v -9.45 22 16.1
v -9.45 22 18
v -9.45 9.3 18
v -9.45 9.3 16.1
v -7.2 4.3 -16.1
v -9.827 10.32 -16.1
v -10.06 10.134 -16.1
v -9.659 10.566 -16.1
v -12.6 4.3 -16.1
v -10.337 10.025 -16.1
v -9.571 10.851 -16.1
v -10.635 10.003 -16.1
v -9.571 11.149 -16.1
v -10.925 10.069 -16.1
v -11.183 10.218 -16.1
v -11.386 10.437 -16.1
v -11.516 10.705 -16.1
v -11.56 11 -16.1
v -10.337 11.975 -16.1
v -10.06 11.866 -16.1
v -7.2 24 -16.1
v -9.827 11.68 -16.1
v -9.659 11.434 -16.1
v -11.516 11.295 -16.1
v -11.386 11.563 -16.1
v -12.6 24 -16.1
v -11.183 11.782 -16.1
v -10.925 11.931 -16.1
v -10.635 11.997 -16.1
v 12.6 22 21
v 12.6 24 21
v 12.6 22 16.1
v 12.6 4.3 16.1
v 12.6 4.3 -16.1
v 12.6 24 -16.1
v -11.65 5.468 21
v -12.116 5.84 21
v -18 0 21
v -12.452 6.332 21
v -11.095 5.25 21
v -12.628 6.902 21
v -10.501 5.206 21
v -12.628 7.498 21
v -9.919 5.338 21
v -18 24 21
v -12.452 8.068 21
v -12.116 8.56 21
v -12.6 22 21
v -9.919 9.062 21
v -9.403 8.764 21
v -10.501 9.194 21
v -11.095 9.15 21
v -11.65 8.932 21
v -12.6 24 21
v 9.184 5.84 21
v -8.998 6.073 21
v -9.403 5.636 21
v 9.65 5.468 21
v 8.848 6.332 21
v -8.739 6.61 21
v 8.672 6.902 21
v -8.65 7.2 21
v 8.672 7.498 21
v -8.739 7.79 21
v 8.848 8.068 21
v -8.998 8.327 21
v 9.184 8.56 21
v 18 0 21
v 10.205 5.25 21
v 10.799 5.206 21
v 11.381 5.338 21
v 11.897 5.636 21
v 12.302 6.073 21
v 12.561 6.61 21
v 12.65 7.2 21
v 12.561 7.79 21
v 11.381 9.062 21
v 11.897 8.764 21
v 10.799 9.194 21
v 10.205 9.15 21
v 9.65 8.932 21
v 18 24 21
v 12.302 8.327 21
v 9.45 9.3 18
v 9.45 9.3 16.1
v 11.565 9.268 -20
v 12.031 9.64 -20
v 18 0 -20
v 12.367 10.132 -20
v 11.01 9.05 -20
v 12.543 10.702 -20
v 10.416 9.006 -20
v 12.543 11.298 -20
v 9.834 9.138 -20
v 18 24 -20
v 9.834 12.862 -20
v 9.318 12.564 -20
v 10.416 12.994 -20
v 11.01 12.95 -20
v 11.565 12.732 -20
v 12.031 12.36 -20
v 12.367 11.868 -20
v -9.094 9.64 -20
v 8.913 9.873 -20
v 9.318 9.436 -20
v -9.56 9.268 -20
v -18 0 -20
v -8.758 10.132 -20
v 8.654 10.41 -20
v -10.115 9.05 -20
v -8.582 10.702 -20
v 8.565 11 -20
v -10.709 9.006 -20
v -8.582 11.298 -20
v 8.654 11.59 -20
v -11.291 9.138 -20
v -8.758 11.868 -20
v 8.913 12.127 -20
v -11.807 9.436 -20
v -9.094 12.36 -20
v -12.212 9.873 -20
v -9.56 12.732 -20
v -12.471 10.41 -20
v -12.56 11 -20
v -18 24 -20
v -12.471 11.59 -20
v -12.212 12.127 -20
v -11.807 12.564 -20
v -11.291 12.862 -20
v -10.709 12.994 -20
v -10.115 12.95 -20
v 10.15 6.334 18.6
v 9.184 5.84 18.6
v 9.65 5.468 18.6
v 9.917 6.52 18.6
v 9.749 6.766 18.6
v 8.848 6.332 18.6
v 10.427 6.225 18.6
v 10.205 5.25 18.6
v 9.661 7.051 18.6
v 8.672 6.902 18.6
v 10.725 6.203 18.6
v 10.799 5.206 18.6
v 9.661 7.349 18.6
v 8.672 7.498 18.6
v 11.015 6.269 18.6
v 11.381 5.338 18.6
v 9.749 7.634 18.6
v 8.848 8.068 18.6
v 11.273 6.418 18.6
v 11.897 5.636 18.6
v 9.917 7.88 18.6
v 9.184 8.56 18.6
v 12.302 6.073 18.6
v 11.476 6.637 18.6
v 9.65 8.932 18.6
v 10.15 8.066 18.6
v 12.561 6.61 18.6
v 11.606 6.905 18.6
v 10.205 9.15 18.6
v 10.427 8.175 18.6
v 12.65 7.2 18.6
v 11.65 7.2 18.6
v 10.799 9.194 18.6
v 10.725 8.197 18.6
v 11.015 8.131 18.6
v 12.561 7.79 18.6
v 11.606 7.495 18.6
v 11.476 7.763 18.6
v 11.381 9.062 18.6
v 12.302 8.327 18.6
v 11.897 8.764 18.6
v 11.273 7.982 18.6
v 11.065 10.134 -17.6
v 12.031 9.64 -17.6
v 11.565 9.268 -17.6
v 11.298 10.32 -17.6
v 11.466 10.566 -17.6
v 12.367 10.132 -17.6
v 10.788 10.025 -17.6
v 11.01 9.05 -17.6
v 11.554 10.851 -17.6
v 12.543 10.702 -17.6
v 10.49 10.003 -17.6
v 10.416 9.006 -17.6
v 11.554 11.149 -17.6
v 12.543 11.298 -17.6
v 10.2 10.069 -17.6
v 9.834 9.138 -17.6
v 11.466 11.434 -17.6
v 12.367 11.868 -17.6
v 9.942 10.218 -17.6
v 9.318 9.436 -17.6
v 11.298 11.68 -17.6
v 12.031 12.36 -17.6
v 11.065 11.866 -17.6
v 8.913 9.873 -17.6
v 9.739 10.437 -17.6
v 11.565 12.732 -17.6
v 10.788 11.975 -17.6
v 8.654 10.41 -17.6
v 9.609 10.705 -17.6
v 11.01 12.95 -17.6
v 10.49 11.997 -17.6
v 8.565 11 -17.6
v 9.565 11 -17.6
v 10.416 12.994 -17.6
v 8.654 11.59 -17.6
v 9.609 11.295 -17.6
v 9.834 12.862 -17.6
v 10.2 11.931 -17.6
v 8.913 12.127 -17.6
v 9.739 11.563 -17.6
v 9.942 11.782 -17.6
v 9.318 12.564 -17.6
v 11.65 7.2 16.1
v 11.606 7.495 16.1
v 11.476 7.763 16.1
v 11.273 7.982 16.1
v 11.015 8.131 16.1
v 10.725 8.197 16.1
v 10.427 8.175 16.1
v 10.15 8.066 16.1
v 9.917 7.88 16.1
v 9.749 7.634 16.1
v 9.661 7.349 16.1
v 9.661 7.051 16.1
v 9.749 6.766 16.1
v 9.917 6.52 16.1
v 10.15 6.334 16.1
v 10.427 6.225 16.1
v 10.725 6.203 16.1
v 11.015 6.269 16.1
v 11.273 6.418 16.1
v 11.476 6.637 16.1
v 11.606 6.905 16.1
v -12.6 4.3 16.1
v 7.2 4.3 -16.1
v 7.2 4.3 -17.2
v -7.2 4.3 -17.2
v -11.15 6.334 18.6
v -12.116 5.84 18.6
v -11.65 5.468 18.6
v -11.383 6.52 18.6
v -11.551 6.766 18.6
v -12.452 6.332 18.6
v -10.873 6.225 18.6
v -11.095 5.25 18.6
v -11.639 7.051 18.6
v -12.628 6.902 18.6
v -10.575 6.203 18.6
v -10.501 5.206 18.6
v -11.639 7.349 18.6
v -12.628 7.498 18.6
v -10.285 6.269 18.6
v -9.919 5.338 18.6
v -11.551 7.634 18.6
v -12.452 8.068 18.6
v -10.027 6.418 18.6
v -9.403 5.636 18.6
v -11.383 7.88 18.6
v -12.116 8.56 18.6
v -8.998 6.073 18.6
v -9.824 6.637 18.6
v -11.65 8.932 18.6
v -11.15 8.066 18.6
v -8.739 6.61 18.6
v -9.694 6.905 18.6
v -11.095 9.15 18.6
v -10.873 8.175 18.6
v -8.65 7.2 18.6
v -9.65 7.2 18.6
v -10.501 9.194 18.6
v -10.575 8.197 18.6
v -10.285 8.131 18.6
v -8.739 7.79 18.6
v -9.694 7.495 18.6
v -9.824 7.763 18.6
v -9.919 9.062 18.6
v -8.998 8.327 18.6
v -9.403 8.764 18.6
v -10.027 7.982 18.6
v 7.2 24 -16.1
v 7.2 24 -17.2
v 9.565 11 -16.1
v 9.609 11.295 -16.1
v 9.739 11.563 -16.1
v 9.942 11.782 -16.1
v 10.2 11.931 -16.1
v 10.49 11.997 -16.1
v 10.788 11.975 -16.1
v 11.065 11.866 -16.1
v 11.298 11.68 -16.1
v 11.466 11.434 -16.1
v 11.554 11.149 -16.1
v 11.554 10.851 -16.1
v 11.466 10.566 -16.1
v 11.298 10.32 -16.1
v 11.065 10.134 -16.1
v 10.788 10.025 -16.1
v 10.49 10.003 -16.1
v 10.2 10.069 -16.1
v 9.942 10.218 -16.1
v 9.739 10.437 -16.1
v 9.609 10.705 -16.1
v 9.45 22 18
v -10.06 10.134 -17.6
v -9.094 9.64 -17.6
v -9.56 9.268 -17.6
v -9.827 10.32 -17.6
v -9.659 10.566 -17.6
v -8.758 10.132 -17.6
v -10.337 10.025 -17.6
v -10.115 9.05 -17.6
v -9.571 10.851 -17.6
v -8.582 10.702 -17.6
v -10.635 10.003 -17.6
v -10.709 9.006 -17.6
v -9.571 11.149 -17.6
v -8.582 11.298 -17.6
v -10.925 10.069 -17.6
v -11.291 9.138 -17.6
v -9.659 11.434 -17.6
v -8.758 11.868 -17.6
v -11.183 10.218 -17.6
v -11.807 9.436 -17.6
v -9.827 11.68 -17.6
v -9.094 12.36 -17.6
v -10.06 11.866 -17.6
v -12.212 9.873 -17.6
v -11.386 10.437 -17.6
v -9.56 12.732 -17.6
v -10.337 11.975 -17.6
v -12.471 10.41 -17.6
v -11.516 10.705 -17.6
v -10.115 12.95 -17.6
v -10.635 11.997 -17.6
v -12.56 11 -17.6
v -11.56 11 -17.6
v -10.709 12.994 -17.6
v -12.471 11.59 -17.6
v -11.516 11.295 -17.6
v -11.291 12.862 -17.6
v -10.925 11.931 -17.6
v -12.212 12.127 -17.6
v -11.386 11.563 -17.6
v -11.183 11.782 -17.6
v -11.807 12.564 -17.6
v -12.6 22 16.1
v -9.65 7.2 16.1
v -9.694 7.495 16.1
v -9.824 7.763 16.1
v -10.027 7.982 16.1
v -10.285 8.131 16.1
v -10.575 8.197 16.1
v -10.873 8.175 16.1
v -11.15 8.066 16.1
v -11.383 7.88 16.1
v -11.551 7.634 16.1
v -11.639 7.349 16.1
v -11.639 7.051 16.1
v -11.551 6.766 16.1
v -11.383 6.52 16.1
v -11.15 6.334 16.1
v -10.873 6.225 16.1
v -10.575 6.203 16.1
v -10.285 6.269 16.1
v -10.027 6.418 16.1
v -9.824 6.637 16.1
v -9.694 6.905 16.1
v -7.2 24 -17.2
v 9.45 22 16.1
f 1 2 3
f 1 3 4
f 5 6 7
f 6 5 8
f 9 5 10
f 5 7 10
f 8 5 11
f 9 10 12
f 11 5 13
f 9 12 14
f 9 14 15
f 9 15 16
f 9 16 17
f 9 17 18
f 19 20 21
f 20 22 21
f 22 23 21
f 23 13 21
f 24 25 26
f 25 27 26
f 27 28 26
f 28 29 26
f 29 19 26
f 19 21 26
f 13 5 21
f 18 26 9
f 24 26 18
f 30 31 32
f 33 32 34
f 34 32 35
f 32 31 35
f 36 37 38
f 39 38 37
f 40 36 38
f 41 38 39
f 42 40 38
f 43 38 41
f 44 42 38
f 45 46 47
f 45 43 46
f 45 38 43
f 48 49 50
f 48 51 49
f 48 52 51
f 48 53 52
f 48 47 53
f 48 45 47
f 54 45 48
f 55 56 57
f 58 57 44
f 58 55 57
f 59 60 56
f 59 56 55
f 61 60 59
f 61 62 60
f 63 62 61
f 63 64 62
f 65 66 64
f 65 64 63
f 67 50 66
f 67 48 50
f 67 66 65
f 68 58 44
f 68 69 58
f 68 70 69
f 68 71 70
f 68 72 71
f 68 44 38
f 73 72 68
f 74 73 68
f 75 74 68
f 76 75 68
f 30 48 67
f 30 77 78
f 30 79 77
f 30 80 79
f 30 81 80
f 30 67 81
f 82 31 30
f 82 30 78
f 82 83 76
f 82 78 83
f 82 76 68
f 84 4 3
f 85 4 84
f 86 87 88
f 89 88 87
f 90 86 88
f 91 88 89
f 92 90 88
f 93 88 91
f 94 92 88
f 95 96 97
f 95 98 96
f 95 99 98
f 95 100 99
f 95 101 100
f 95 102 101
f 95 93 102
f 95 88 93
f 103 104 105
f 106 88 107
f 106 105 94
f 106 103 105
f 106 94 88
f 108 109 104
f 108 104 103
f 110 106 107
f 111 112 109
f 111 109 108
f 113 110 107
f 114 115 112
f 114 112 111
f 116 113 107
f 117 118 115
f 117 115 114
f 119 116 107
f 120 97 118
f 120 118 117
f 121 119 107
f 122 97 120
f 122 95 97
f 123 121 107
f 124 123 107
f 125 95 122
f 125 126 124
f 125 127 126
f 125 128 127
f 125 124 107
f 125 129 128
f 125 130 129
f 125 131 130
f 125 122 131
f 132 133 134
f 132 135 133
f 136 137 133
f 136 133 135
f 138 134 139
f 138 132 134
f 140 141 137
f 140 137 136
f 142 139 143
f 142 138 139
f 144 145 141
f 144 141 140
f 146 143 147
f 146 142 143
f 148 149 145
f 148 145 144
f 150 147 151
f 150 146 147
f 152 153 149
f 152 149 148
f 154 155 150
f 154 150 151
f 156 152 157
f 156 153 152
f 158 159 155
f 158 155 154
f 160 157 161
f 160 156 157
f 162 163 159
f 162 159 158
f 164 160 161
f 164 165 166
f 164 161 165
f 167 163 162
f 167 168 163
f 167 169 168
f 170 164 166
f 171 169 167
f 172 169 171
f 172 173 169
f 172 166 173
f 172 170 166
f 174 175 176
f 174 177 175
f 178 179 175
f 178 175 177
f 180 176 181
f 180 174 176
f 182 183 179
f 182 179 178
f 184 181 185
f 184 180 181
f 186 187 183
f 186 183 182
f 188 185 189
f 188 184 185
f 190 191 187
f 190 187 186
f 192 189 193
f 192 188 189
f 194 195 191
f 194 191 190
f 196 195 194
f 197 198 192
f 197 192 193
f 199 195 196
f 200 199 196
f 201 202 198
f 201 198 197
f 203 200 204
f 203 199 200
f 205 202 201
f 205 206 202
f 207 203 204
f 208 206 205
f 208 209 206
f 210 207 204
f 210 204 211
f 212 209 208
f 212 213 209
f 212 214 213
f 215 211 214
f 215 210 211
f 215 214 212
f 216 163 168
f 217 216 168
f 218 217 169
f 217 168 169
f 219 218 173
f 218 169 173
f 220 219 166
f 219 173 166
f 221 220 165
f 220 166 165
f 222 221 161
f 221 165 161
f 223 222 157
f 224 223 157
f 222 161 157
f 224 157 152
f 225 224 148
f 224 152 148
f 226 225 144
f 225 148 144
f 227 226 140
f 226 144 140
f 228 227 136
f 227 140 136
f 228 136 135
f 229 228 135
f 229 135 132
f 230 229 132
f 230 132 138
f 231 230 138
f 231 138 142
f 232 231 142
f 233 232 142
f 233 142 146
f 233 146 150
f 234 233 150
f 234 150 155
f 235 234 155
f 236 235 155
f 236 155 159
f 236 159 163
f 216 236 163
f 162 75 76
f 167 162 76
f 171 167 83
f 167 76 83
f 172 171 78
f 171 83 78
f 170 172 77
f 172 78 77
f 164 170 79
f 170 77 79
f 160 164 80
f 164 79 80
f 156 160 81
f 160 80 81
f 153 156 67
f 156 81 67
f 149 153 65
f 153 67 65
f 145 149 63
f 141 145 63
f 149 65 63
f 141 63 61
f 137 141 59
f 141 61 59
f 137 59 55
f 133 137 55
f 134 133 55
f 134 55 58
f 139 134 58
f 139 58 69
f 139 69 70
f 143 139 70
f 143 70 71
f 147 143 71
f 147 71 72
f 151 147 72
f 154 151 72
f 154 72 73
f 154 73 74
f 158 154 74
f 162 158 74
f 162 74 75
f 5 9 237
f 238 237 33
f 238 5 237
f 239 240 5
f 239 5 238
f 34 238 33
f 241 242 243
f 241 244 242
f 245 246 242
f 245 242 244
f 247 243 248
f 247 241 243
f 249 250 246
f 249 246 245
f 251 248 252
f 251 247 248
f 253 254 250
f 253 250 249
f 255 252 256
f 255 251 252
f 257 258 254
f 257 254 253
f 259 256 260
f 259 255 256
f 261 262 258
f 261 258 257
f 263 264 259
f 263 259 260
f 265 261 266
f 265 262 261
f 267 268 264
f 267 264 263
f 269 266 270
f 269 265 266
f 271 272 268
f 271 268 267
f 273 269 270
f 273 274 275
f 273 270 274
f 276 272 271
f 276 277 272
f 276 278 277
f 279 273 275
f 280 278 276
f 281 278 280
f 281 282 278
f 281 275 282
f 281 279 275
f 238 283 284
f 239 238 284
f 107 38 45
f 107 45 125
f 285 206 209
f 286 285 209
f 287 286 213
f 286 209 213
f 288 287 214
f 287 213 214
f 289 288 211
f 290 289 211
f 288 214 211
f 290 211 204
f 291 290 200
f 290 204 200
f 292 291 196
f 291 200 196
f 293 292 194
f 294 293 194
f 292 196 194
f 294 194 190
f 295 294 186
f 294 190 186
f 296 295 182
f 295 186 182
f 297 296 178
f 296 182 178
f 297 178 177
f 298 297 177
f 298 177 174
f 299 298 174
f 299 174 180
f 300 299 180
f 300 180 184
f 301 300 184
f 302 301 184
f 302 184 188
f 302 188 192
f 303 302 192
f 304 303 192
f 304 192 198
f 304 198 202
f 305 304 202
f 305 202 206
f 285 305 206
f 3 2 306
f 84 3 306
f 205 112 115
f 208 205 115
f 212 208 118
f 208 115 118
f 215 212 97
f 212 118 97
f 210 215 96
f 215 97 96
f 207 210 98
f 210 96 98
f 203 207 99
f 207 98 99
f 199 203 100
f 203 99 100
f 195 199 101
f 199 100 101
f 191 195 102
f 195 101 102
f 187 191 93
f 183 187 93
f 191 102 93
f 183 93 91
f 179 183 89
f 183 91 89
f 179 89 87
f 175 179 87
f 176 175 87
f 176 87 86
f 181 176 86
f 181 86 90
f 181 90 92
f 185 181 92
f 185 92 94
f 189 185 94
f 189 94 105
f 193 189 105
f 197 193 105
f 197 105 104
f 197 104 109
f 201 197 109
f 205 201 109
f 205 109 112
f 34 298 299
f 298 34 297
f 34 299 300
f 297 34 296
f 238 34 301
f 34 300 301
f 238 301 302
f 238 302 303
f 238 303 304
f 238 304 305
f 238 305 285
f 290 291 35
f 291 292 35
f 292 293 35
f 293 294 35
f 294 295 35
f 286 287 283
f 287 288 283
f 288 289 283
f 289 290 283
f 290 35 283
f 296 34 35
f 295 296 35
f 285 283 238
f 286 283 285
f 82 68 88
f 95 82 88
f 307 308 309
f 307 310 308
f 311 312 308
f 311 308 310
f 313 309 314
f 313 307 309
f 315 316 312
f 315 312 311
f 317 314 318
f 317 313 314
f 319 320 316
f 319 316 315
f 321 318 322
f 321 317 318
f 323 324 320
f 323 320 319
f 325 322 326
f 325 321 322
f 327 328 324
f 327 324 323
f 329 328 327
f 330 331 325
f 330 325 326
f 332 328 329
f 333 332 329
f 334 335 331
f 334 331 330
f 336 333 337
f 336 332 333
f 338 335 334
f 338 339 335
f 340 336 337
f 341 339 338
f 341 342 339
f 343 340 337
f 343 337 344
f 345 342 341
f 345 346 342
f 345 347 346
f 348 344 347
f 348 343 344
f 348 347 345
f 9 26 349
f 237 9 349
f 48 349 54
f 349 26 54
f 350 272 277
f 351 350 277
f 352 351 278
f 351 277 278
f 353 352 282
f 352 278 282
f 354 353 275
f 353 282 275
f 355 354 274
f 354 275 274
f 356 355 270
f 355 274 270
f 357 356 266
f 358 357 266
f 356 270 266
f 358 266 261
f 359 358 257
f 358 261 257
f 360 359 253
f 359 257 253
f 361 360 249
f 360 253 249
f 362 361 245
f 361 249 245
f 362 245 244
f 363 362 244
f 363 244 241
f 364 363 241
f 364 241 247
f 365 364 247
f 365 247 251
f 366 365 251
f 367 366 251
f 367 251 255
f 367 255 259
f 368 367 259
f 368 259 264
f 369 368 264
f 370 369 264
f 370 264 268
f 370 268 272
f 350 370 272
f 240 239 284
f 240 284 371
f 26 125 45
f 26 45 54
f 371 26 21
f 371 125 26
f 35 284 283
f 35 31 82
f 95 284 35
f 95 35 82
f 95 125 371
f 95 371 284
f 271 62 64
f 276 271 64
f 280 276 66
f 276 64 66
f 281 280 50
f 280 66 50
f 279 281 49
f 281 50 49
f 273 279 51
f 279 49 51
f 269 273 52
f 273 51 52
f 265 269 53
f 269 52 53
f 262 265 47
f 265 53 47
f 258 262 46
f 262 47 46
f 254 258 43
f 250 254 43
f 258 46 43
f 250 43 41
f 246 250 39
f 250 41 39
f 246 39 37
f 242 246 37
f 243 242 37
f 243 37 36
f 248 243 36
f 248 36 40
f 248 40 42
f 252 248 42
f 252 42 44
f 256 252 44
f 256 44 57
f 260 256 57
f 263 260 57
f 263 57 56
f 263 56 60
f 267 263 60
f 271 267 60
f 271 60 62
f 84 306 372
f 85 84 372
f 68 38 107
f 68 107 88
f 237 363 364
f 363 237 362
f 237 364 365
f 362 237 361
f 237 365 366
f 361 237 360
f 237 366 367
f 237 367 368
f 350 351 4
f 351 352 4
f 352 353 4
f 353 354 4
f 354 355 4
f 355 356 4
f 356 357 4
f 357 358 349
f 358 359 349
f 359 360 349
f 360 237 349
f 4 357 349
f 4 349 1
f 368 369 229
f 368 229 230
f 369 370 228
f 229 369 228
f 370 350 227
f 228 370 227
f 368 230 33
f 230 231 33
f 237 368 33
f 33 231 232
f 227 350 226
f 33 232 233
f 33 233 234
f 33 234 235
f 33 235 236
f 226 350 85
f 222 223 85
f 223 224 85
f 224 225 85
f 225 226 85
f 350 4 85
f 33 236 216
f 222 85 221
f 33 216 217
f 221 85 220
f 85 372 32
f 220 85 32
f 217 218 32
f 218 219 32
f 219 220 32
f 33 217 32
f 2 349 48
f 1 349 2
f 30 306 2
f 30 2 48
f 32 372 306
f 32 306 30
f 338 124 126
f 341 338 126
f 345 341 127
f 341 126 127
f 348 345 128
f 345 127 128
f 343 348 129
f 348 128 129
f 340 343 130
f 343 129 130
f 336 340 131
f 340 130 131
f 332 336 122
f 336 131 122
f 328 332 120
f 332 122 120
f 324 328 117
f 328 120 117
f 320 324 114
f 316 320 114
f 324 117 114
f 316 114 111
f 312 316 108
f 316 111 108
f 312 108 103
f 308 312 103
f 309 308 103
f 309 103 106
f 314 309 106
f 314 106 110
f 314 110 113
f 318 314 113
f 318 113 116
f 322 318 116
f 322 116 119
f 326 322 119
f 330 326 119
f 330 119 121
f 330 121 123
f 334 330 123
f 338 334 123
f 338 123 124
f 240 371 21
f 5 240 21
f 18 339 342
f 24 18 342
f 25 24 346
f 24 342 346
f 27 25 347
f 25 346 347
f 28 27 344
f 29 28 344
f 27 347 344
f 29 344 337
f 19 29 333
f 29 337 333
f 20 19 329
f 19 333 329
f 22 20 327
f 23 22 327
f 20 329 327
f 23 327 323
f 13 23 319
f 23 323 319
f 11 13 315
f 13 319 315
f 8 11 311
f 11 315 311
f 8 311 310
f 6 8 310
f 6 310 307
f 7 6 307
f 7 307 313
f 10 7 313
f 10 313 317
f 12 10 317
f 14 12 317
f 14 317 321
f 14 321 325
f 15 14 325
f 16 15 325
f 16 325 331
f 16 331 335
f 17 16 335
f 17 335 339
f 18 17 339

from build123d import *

# Parameters (mm, degrees)
SKETCH_3_W           = 36
SKETCH_3_H           = 50
EXTRUDE_1_DEPTH      = 24
SKETCH_4_W           = 24.8
SKETCH_4_H           = 31.8
CUT_EXTRUDE_1_DEPTH  = 19.7
SKETCH_5_W           = 14
SKETCH_5_H           = 2.2
CUT_EXTRUDE_3_DEPTH  = 19.7
SKETCH_6_W           = 18.5
SKETCH_6_H           = 3.8
CUT_EXTRUDE_4_DEPTH  = 14.7
SKETCH_7_W           = 24.8
SKETCH_7_H           = 24.280407208
CUT_EXTRUDE_5_DEPTH  = 2
SKETCH_8_R           = 2
CUT_EXTRUDE_6_DEPTH  = 6.4
SKETCH_9_R           = 1
CUT_EXTRUDE_7_DEPTH  = 6.4
SKETCH_10_R          = 2
CUT_EXTRUDE_8_DEPTH  = 7.4
SKETCH_11_R          = 1
CUT_EXTRUDE_9_DEPTH  = 7.4
SKETCH_14_W          = 47.693248889
SKETCH_14_H          = 41.94352182
CUT_EXTRUDE_12_DEPTH = 4
SKETCH_16_W          = 69.166934332
SKETCH_16_H          = 39.422219991
CUT_EXTRUDE_13_DEPTH = 5
CUT_EXTRUDE_17_DEPTH = 19.7
SKETCH_19_W          = 18.9
SKETCH_19_H          = 2.1
CUT_EXTRUDE_18_DEPTH = 12.7
SKETCH_20_W          = 25.2
SKETCH_20_H          = 38.217614171
CUT_EXTRUDE_19_DEPTH = 2


with BuildPart() as part:
    # 草图3 → 凸台-拉伸1 (new body)
    with BuildSketch(Plane(origin=(0, 0, 0), x_dir=(1, 0, 0), z_dir=(0, 1, 0))):
        Rectangle(SKETCH_3_W, SKETCH_3_H)
    extrude(amount=EXTRUDE_1_DEPTH)

    # 草图4 → 切除-拉伸1 (cut)
    with BuildSketch(Plane(origin=(0, 24, 0), x_dir=(1, 0, 0), z_dir=(0, 1, 0))):
        Rectangle(SKETCH_4_W, SKETCH_4_H)
    extrude(amount=-CUT_EXTRUDE_1_DEPTH, mode=Mode.SUBTRACT)

    # 草图5 → 切除-拉伸3 (cut)
    with BuildSketch(Plane(origin=(0, 24, 0), x_dir=(1, 0, 0), z_dir=(0, 1, 0))):
        with Locations((0, 15.9)):
            Rectangle(SKETCH_5_W, SKETCH_5_H)
    extrude(amount=-CUT_EXTRUDE_3_DEPTH, mode=Mode.SUBTRACT)

    # 草图6 → 切除-拉伸4 (cut)
    with BuildSketch(Plane(origin=(0, 24, 0), x_dir=(1, 0, 0), z_dir=(0, 1, 0))):
        with Locations((0, -15.9)):
            Rectangle(SKETCH_6_W, SKETCH_6_H)
    extrude(amount=-CUT_EXTRUDE_4_DEPTH, mode=Mode.SUBTRACT)

    # 草图7 → 切除-拉伸5 (cut)
    with BuildSketch(Plane(origin=(0, 24, 0), x_dir=(1, 0, 0), z_dir=(0, 1, 0))):
        with Locations((0, -25)):
            Rectangle(SKETCH_7_W, SKETCH_7_H)
    extrude(amount=-CUT_EXTRUDE_5_DEPTH, mode=Mode.SUBTRACT)

    # 草图8 → 切除-拉伸6 (cut)
    with BuildSketch(Plane.XY.offset(25)):
        with Locations((10.65, 7.2)):
            Circle(SKETCH_8_R)
        with Locations((-10.65, 7.2)):
            Circle(SKETCH_8_R)
    extrude(amount=-CUT_EXTRUDE_6_DEPTH, mode=Mode.SUBTRACT)

    # 草图9 → 切除-拉伸7 (cut)
    with BuildSketch(Plane.XY.offset(18.6)):
        with Locations((10.65, 7.2)):
            Circle(SKETCH_9_R)
        with Locations((-10.65, 7.2)):
            Circle(SKETCH_9_R)
    extrude(amount=-CUT_EXTRUDE_7_DEPTH, mode=Mode.SUBTRACT)

    # 草图10 → 切除-拉伸8 (cut)
    with BuildSketch(Plane(origin=(0, 0, -25), x_dir=(-1, 0, 0), z_dir=(0, 0, -1))):
        with Locations((-10.565, 11)):
            Circle(SKETCH_10_R)
        with Locations((10.56, 11)):
            Circle(SKETCH_10_R)
    extrude(amount=-CUT_EXTRUDE_8_DEPTH, mode=Mode.SUBTRACT)

    # 草图11 → 切除-拉伸9 (cut)
    with BuildSketch(Plane(origin=(0, 0, -17.6), x_dir=(-1, 0, 0), z_dir=(0, 0, -1))):
        with Locations((10.56, 11)):
            Circle(SKETCH_11_R)
        with Locations((-10.565, 11)):
            Circle(SKETCH_11_R)
    extrude(amount=-CUT_EXTRUDE_9_DEPTH, mode=Mode.SUBTRACT)

    # 草图14 → 切除-拉伸12 (cut)
    with BuildSketch(Plane.XY.offset(25)):
        with Locations((-2.653720185, 12.393348568)):
            Rectangle(SKETCH_14_W, SKETCH_14_H)
    extrude(amount=-CUT_EXTRUDE_12_DEPTH, mode=Mode.SUBTRACT)

    # 草图16 → 切除-拉伸13 (cut)
    with BuildSketch(Plane(origin=(0, 0, -25), x_dir=(-1, 0, 0), z_dir=(0, 0, -1))):
        with Locations((0.858826259, 12.588310345)):
            Rectangle(SKETCH_16_W, SKETCH_16_H)
    extrude(amount=-CUT_EXTRUDE_13_DEPTH, mode=Mode.SUBTRACT)

    # 草图18 → 切除-拉伸17 (cut)
    with BuildSketch(Plane(origin=(0, 24, 0), x_dir=(1, 0, 0), z_dir=(0, 1, 0))):
        Polygon((-12.6, -16.1), (12.6, -16.1), (12.6, 16.1), (7.2, 16.1), (7.2, 17.2), (-7.2, 17.2), (-7.2, 16.1), (-12.6, 16.1), align=None)
    extrude(amount=-CUT_EXTRUDE_17_DEPTH, mode=Mode.SUBTRACT)

    # 草图19 → 切除-拉伸18 (cut)
    with BuildSketch(Plane(origin=(0, 22, 0), x_dir=(1, 0, 0), z_dir=(0, 1, 0))):
        with Locations((0, -16.95)):
            Rectangle(SKETCH_19_W, SKETCH_19_H)
    extrude(amount=-CUT_EXTRUDE_18_DEPTH, mode=Mode.SUBTRACT)

    # 草图20 → 切除-拉伸19 (cut)
    with BuildSketch(Plane(origin=(0, 24, 0), x_dir=(1, 0, 0), z_dir=(0, 1, 0))):
        with Locations((0, -3.008807086)):
            Rectangle(SKETCH_20_W, SKETCH_20_H)
    extrude(amount=-CUT_EXTRUDE_19_DEPTH, mode=Mode.SUBTRACT)


solid = part.part
